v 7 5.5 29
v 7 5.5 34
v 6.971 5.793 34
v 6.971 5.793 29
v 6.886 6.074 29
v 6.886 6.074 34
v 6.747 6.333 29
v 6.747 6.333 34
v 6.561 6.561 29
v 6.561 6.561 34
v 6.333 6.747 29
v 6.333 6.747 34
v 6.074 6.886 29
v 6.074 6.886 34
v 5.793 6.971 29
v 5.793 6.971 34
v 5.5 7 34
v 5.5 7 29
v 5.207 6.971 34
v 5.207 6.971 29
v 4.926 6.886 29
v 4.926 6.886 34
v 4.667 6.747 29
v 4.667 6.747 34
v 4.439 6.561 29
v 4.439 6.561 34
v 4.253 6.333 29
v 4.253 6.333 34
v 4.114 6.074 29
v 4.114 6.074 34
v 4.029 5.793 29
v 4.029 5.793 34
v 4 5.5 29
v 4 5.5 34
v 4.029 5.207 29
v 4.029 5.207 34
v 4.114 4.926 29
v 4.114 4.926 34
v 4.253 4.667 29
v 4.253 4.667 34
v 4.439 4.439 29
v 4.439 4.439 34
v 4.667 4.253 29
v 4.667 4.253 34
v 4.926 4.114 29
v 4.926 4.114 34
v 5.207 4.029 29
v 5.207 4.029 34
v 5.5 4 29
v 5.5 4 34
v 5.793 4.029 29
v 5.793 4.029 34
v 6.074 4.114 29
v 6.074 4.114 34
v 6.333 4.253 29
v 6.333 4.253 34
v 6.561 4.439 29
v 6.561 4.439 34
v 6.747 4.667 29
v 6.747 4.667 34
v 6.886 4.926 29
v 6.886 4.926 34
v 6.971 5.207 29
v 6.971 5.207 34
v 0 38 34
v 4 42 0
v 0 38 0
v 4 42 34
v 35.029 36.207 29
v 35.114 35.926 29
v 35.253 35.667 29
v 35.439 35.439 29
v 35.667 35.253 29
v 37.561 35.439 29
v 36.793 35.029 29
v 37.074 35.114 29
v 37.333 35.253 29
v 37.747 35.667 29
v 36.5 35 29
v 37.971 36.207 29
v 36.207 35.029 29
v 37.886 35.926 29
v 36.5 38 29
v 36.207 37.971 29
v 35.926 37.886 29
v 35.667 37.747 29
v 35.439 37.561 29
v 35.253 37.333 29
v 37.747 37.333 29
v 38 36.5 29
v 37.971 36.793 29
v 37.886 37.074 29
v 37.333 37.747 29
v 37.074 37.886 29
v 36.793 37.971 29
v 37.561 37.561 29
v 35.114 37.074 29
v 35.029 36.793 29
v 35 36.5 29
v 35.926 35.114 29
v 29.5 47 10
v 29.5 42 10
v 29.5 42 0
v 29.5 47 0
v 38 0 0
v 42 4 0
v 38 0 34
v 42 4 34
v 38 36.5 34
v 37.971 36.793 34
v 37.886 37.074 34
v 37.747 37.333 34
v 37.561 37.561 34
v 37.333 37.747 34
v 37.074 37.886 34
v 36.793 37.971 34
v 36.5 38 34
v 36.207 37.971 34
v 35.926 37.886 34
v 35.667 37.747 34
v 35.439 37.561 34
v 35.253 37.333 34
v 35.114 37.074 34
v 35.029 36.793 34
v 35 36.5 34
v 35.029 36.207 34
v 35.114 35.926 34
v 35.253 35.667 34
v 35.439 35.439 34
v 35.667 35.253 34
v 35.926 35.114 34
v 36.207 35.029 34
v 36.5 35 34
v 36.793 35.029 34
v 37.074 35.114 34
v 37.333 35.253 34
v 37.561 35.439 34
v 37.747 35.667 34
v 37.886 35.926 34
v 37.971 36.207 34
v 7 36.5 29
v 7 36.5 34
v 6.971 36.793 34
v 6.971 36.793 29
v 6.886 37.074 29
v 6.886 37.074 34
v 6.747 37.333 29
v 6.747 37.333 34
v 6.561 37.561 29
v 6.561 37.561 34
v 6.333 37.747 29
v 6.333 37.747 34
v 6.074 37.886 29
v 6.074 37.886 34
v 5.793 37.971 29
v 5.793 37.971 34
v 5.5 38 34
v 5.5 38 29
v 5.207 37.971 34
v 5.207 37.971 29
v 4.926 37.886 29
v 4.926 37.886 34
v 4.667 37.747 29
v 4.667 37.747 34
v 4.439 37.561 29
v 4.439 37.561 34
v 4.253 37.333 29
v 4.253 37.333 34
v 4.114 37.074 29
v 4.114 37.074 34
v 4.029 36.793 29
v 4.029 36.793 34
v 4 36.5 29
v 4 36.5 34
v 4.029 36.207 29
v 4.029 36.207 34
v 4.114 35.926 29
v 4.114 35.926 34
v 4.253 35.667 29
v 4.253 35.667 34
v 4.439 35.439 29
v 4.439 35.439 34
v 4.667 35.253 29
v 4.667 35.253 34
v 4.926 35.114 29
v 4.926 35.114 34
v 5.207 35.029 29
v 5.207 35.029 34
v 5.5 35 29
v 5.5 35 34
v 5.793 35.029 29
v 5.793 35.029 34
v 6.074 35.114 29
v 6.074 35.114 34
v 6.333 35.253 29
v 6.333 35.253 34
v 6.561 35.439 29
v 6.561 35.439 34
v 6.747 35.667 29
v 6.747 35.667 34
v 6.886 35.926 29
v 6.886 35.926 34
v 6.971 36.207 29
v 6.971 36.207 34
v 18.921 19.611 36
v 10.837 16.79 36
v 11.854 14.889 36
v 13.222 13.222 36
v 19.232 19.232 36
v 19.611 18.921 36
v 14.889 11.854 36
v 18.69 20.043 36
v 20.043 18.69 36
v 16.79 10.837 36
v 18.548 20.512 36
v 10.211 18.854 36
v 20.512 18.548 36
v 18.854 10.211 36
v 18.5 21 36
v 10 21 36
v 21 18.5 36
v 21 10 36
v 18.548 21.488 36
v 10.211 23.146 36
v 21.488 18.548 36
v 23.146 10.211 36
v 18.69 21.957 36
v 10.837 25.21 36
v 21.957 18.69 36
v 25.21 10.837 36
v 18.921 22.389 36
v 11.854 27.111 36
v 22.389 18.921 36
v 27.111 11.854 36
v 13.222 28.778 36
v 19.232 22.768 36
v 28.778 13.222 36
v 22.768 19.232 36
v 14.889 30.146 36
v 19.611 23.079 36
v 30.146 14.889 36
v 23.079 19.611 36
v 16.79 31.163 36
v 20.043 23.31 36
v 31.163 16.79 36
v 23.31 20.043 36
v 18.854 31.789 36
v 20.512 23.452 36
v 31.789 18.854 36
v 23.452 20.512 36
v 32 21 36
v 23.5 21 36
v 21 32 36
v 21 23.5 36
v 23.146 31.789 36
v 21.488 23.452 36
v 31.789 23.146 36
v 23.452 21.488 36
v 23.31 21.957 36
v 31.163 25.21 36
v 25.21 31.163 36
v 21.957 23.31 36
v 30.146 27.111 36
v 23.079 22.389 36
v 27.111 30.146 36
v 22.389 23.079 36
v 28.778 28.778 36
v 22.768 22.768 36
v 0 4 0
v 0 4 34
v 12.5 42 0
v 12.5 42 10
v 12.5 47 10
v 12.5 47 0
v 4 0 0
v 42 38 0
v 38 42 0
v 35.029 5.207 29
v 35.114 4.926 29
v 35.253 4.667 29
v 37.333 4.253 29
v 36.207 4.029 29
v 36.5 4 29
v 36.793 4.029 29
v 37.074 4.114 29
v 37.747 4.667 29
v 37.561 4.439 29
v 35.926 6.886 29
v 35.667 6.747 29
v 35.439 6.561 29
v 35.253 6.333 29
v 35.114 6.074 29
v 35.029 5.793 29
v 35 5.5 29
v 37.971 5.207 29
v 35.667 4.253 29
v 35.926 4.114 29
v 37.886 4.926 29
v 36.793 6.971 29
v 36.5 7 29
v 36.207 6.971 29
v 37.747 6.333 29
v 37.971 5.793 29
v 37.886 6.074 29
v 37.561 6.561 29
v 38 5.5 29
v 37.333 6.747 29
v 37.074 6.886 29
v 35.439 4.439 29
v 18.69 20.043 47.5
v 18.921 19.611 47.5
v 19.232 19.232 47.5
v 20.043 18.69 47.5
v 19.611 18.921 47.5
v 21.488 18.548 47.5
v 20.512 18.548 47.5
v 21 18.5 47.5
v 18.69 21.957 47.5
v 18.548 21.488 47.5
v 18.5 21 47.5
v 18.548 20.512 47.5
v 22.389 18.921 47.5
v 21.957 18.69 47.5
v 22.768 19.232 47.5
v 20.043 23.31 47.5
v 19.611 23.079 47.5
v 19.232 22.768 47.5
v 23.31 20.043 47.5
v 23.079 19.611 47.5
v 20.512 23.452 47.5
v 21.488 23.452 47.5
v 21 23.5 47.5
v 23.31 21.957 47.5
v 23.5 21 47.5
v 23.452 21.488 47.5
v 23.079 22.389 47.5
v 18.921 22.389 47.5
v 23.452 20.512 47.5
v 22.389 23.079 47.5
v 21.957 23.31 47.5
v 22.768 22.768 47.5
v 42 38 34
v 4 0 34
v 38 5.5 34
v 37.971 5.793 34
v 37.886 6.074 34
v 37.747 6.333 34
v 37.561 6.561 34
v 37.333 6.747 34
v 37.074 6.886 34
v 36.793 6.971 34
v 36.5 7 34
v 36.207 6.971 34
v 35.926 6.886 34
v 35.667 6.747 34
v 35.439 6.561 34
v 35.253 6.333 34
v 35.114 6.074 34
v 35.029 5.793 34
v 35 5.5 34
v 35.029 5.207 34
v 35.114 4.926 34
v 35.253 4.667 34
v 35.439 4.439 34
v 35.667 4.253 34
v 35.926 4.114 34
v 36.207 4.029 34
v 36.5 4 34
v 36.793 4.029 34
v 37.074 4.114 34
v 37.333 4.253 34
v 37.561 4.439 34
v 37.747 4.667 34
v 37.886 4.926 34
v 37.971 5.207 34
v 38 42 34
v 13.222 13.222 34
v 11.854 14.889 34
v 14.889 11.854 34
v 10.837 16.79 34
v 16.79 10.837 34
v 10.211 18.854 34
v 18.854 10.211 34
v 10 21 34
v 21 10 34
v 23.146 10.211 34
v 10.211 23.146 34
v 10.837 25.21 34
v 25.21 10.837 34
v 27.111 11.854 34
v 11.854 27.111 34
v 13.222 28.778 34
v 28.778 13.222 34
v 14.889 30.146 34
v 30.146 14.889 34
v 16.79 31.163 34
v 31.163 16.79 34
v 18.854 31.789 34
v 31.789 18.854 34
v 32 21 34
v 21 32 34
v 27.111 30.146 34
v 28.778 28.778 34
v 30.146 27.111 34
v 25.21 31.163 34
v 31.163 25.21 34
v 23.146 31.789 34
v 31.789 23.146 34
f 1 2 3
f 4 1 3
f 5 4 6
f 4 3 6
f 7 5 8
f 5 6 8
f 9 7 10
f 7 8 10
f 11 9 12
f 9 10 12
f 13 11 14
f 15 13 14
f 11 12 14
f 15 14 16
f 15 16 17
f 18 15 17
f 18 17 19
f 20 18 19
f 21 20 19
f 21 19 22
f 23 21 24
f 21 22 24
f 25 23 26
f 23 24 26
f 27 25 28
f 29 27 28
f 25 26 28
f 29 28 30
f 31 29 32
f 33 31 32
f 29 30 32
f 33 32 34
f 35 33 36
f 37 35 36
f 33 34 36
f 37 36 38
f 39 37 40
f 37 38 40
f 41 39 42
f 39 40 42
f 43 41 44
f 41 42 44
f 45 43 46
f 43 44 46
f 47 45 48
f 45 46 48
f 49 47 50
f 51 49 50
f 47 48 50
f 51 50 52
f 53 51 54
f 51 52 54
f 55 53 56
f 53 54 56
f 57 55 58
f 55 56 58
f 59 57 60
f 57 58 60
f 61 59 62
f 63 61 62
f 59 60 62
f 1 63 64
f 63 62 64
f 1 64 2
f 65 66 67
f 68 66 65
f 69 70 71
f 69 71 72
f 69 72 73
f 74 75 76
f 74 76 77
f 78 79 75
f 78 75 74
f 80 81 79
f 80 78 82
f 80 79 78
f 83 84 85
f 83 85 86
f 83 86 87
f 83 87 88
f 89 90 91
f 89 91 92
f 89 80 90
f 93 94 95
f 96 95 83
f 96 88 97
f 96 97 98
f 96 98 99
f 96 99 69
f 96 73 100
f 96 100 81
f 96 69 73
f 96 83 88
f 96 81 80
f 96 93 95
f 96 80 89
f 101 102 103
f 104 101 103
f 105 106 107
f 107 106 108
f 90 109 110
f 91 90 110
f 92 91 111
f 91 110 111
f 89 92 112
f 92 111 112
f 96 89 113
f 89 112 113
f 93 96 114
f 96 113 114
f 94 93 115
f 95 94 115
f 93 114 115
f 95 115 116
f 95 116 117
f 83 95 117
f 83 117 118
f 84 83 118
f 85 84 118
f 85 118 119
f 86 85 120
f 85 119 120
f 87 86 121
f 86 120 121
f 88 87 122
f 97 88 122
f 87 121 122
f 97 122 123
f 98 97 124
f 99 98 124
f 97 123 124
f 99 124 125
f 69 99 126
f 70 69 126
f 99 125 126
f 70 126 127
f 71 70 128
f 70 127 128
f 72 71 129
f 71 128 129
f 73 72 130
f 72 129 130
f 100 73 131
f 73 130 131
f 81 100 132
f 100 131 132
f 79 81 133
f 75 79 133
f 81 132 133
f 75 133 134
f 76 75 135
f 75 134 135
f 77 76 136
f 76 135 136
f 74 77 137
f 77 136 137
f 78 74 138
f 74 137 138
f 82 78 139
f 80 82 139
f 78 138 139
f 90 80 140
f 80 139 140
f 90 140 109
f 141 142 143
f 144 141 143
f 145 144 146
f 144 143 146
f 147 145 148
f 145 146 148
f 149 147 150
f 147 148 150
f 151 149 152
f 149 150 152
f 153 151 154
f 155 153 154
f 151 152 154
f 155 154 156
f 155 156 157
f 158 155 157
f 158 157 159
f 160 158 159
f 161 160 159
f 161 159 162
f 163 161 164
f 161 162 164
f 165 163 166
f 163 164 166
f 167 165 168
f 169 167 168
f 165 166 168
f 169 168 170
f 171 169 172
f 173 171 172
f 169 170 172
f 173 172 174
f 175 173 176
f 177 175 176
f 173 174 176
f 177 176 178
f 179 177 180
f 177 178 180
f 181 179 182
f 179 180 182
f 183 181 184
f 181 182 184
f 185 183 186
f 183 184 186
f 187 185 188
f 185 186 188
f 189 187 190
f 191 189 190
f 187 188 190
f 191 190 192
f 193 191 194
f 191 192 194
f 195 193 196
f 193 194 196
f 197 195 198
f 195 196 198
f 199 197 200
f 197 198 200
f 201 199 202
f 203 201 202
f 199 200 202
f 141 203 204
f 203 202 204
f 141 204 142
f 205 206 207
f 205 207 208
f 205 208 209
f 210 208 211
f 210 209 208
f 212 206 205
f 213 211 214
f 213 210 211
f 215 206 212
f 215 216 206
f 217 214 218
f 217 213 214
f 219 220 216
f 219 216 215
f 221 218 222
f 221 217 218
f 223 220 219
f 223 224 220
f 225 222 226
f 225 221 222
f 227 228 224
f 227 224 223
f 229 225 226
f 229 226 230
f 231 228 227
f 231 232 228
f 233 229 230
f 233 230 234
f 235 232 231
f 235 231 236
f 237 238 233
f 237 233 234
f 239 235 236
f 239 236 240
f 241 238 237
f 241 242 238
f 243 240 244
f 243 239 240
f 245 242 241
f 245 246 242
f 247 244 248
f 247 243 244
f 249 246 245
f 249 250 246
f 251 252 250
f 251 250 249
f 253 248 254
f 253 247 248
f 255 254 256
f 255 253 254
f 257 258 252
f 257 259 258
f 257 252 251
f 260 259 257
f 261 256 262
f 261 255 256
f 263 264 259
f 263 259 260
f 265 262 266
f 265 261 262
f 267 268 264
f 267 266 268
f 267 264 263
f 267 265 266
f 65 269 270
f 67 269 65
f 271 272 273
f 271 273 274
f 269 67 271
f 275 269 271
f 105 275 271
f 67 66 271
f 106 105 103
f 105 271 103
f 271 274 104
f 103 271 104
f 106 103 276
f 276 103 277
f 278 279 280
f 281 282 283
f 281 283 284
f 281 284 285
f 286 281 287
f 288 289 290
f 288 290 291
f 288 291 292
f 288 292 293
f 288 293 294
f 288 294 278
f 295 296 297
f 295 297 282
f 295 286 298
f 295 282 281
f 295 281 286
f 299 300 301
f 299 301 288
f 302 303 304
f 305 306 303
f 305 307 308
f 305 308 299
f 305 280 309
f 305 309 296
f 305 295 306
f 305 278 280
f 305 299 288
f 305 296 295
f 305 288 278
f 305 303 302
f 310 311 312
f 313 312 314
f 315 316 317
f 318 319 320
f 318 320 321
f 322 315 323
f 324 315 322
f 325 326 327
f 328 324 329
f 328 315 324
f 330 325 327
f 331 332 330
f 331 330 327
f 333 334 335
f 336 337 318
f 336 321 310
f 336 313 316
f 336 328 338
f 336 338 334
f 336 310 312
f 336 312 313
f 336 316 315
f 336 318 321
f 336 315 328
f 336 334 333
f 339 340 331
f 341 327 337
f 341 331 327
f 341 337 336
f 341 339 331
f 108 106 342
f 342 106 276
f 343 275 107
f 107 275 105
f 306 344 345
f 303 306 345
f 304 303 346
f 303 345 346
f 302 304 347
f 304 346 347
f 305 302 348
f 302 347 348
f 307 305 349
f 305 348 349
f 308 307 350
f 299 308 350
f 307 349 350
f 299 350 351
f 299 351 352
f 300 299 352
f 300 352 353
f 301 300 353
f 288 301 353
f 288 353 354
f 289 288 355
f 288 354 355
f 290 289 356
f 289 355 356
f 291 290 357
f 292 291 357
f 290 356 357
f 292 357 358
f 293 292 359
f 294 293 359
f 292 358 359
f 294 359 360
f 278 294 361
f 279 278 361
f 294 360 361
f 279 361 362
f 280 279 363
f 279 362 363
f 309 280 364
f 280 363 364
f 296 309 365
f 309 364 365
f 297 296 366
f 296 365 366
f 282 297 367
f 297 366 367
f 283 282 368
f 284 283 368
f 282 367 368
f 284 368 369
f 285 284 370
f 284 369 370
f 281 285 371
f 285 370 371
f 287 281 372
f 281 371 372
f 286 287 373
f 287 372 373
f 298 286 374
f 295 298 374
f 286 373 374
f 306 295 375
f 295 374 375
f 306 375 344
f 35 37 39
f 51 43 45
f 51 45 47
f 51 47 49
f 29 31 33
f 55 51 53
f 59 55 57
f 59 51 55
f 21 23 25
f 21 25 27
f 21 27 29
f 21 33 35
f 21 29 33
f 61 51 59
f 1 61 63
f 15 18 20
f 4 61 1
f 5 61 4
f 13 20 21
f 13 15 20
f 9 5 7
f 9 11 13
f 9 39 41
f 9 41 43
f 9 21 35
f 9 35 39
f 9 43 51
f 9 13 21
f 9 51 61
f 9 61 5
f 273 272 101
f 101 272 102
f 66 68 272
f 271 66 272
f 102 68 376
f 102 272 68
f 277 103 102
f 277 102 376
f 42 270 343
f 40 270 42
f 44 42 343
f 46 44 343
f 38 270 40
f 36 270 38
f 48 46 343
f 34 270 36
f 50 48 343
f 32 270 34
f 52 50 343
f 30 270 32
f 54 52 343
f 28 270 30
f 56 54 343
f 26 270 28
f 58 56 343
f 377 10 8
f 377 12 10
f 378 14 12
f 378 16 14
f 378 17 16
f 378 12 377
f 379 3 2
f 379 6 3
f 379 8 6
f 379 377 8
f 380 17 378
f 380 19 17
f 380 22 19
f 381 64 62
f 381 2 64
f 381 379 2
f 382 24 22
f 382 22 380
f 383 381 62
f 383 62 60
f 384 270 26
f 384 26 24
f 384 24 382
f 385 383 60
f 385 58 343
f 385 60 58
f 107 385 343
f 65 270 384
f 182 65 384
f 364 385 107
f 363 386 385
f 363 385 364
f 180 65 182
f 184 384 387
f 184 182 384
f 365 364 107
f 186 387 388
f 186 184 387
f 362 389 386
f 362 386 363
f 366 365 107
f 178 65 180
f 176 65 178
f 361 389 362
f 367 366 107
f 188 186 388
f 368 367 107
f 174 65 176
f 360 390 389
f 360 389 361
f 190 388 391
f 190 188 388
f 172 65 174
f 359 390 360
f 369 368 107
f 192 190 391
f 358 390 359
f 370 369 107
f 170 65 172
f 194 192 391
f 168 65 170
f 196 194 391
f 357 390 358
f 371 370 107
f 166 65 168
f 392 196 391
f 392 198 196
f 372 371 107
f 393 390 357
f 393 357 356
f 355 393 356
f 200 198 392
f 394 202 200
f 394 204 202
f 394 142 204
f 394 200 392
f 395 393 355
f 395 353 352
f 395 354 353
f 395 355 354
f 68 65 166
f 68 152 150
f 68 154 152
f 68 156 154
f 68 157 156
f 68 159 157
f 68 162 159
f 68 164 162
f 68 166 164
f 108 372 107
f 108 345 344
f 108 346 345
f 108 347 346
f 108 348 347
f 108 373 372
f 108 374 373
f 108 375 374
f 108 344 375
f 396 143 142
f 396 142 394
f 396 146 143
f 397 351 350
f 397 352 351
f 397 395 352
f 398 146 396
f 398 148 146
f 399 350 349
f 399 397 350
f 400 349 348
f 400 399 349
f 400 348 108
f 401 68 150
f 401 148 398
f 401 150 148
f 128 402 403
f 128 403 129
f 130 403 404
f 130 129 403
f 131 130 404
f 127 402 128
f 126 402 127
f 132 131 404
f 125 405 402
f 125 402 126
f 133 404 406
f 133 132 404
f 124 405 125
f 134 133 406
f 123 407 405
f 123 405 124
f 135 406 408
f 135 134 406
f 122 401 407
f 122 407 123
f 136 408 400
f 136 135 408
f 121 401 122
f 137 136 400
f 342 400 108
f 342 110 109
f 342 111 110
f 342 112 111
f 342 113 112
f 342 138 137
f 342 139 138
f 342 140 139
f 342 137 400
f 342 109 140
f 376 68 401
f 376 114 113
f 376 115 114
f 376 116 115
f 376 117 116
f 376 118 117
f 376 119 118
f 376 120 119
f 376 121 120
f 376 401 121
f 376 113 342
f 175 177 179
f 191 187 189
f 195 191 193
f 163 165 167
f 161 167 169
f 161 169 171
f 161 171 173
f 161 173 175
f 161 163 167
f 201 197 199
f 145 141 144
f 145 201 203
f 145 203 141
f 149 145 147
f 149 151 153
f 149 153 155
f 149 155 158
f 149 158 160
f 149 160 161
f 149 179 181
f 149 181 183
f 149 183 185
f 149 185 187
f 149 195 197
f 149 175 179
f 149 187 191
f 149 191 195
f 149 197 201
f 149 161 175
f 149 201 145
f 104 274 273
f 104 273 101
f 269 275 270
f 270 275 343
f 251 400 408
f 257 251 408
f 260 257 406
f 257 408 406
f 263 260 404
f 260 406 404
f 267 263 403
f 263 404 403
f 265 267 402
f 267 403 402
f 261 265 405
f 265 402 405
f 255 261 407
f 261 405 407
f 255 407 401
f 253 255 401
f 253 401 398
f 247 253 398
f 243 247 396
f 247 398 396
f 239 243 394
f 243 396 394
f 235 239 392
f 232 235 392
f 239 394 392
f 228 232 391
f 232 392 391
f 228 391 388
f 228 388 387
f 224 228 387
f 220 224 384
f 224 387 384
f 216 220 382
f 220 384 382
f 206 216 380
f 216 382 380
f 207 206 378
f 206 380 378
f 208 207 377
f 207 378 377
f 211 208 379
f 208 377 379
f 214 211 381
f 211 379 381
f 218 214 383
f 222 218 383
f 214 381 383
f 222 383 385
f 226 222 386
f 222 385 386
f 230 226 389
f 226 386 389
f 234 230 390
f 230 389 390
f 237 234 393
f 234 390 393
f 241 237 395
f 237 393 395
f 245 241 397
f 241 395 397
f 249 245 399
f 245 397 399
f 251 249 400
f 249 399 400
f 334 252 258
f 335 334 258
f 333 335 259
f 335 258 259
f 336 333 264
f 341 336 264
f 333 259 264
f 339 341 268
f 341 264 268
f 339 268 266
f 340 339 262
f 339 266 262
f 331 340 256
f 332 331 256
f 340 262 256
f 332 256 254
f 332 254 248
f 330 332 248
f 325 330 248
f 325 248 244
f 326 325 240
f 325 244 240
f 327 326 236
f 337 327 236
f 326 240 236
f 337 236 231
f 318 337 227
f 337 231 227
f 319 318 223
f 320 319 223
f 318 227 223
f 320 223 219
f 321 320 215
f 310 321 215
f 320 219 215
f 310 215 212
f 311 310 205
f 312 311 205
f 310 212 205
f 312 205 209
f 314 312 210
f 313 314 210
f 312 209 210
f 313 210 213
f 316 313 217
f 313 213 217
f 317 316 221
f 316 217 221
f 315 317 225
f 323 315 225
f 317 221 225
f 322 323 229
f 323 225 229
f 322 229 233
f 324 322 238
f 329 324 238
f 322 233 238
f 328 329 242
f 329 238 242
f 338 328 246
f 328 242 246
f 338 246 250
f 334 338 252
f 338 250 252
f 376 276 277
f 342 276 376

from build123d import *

# Parameters (mm, degrees)
ESQUISSE1_W             = 42
ESQUISSE1_H             = 42
BOSS_EXTRU_1_DEPTH      = 34
ESQUISSE2_R             = 11
BOSS_EXTRU_2_DEPTH      = 2
ESQUISSE3_R             = 2.5
BOSS_EXTRU_3_DEPTH      = 11.5
CHANFREIN1_SIZE         = 4
ESQUISSE4_W             = 17
ESQUISSE4_H             = 10
BOSS_EXTRU_4_DEPTH      = 5
ESQUISSE5_R             = 1.5
ENL_V_MAT_EXTRU_1_DEPTH = 5


with BuildPart() as part:
    # Esquisse1 → Boss.-Extru.1 (new body)
    with BuildSketch(Plane.XY):
        with Locations((21, 21)):
            Rectangle(ESQUISSE1_W, ESQUISSE1_H)
    extrude(amount=BOSS_EXTRU_1_DEPTH)

    # Esquisse2 → Boss.-Extru.2 (add)
    with BuildSketch(Plane.XY.offset(34)):
        with Locations((21, 21)):
            Circle(ESQUISSE2_R)
    extrude(amount=BOSS_EXTRU_2_DEPTH)

    # Esquisse3 → Boss.-Extru.3 (add)
    with BuildSketch(Plane.XY.offset(36)):
        with Locations((21, 21)):
            Circle(ESQUISSE3_R)
    extrude(amount=BOSS_EXTRU_3_DEPTH)

    # Chanfrein1
    chanfrein1_edges = [part.edges().sort_by_distance(p)[0] for p in [
        (0, 42, 17),
        (42, 42, 17),
        (42, 0, 17),
        (0, 0, 17),
    ]]
    chamfer(chanfrein1_edges, length=CHANFREIN1_SIZE)

    # Esquisse4 → Boss.-Extru.4 (add)
    with BuildSketch(Plane(origin=(0, 42, 0), x_dir=(1, 0, 0), z_dir=(0, 1, 0))):
        with Locations((21, -5)):
            Rectangle(ESQUISSE4_W, ESQUISSE4_H)
    extrude(amount=BOSS_EXTRU_4_DEPTH)

    # Esquisse5 → Enlèv. mat.-Extru.1 (cut)
    with BuildSketch(Plane.XY.offset(34)):
        with Locations((5.5, 36.5)):
            Circle(ESQUISSE5_R)
        with Locations((36.5, 36.5)):
            Circle(ESQUISSE5_R)
        with Locations((36.5, 5.5)):
            Circle(ESQUISSE5_R)
        with Locations((5.5, 5.5)):
            Circle(ESQUISSE5_R)
    extrude(amount=-ENL_V_MAT_EXTRU_1_DEPTH, mode=Mode.SUBTRACT)


solid = part.part
